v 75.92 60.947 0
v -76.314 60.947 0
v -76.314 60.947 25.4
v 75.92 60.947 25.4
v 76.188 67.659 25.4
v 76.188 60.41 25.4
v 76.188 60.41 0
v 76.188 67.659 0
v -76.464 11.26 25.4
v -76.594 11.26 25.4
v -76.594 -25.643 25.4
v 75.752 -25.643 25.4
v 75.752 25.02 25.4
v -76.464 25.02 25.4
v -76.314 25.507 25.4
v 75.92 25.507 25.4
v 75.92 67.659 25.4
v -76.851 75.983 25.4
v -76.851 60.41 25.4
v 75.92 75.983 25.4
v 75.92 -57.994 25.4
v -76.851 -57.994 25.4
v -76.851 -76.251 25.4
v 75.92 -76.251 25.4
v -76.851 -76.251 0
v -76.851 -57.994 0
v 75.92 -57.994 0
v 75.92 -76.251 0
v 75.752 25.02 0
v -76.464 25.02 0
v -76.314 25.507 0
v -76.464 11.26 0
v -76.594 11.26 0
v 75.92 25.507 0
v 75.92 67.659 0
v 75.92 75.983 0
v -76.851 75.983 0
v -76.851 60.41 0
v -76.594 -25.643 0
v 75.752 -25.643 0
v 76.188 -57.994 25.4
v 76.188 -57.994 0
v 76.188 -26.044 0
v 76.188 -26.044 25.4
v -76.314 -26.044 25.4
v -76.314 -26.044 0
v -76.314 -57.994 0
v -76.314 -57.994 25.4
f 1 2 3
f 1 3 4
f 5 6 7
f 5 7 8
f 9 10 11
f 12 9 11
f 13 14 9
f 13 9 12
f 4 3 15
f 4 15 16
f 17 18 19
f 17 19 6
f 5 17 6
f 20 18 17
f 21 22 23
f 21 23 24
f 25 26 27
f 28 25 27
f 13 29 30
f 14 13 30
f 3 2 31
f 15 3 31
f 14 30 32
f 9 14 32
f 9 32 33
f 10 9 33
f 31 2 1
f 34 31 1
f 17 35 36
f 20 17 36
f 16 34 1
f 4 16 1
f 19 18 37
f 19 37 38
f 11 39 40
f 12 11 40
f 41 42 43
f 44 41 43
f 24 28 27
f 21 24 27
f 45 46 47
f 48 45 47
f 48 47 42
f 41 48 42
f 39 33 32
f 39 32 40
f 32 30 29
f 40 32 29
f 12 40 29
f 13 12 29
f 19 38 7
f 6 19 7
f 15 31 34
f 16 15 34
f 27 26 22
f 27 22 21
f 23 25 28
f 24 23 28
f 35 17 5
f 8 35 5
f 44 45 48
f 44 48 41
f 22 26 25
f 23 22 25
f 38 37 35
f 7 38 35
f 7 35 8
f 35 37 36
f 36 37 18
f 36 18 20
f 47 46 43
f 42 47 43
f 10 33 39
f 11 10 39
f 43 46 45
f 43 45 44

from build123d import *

# Parameters (mm, degrees)
F0_W     = 152.3466408253
F0_H     = 14.1597399488
F1_DEPTH = 25.4
F2_W     = 152.2337943316
F2_H     = 19.3312801421
F2_H_2   = 16.1093920469
F3_DEPTH = 25.4
F2_W_2   = 152.5022834539
F2_H_3   = 17.7203342319
F2_H_4   = 14.2299719155
F4_W     = 152.7707725763
F4_H     = 8.3231925964
F4_H_2   = 7.249224931
F4_W_2   = 0.2684816718
F5_DEPTH = 25.4
F4_H_3   = 6.7122429609
F4_H_4   = 11.5450695157


with BuildPart() as f1:
    # F0 (on Top) → F1 (new body)
    with BuildSketch(Plane.XY):
        Polygon((-76.4639377594, 11.2596936524), (-76.5942409635, 11.2596936524), (-76.5942409635, -11.483262293), (75.7523998618, -11.483262293), (75.7523998618, 11.2596936524), align=None)
        Polygon((-76.4639377594, 18.1400524452), (-76.4639377594, 11.2596936524), (75.7523998618, 11.2596936524), (75.7523998618, 25.0204112381), (-76.4639377594, 25.0204112381), align=None)
        with Locations((-0.4209205508, -18.5631322674)):
            Rectangle(F0_W, F0_H)
    extrude(amount=F1_DEPTH)


with BuildPart() as f3:
    # F2 (on Top) → F3 (new body)
    with BuildSketch(Plane.XY):
        with Locations((-0.1971200109, 51.2815769762)):
            Rectangle(F2_W, F2_H)
        with Locations((-0.1971200109, 33.5612408817)):
            Rectangle(F2_W, F2_H_2)
    extrude(amount=F3_DEPTH)


with BuildPart() as f3b:
    # F2 (on Top) → F3, piece 2 (new body)
    with BuildSketch(Plane.XY):
        with Locations((-0.0628754497, -34.9036902189)):
            Rectangle(F2_W_2, F2_H_3)
        with Locations((-0.0628754497, -50.8788432926)):
            Rectangle(F2_W_2, F2_H_4)
    extrude(amount=F3_DEPTH)


with BuildPart() as f5:
    # F4 (on face) → F5 (new body)
    with BuildSketch(Plane.XY):
        with Locations((-0.4656091332, 71.8210563064)):
            Rectangle(F4_W, F4_H)
        with Locations((-0.4656091332, 64.0348475426)):
            Rectangle(F4_W, F4_H_2)
        with Locations((76.0540179908, 64.0348475426)):
            Rectangle(F4_W_2, F4_H_2)
    extrude(amount=F5_DEPTH)


with BuildPart() as f5b:
    # F4 (on face) → F5, piece 2 (new body)
    with BuildSketch(Plane.XY):
        with Locations((-0.4656091332, -61.3499507308)):
            Rectangle(F4_W, F4_H_3)
        with Locations((-0.4656091332, -70.4786069691)):
            Rectangle(F4_W, F4_H_4)
    extrude(amount=F5_DEPTH)


solid = Compound([f1.part, f3.part, f3b.part, f5.part, f5b.part])
